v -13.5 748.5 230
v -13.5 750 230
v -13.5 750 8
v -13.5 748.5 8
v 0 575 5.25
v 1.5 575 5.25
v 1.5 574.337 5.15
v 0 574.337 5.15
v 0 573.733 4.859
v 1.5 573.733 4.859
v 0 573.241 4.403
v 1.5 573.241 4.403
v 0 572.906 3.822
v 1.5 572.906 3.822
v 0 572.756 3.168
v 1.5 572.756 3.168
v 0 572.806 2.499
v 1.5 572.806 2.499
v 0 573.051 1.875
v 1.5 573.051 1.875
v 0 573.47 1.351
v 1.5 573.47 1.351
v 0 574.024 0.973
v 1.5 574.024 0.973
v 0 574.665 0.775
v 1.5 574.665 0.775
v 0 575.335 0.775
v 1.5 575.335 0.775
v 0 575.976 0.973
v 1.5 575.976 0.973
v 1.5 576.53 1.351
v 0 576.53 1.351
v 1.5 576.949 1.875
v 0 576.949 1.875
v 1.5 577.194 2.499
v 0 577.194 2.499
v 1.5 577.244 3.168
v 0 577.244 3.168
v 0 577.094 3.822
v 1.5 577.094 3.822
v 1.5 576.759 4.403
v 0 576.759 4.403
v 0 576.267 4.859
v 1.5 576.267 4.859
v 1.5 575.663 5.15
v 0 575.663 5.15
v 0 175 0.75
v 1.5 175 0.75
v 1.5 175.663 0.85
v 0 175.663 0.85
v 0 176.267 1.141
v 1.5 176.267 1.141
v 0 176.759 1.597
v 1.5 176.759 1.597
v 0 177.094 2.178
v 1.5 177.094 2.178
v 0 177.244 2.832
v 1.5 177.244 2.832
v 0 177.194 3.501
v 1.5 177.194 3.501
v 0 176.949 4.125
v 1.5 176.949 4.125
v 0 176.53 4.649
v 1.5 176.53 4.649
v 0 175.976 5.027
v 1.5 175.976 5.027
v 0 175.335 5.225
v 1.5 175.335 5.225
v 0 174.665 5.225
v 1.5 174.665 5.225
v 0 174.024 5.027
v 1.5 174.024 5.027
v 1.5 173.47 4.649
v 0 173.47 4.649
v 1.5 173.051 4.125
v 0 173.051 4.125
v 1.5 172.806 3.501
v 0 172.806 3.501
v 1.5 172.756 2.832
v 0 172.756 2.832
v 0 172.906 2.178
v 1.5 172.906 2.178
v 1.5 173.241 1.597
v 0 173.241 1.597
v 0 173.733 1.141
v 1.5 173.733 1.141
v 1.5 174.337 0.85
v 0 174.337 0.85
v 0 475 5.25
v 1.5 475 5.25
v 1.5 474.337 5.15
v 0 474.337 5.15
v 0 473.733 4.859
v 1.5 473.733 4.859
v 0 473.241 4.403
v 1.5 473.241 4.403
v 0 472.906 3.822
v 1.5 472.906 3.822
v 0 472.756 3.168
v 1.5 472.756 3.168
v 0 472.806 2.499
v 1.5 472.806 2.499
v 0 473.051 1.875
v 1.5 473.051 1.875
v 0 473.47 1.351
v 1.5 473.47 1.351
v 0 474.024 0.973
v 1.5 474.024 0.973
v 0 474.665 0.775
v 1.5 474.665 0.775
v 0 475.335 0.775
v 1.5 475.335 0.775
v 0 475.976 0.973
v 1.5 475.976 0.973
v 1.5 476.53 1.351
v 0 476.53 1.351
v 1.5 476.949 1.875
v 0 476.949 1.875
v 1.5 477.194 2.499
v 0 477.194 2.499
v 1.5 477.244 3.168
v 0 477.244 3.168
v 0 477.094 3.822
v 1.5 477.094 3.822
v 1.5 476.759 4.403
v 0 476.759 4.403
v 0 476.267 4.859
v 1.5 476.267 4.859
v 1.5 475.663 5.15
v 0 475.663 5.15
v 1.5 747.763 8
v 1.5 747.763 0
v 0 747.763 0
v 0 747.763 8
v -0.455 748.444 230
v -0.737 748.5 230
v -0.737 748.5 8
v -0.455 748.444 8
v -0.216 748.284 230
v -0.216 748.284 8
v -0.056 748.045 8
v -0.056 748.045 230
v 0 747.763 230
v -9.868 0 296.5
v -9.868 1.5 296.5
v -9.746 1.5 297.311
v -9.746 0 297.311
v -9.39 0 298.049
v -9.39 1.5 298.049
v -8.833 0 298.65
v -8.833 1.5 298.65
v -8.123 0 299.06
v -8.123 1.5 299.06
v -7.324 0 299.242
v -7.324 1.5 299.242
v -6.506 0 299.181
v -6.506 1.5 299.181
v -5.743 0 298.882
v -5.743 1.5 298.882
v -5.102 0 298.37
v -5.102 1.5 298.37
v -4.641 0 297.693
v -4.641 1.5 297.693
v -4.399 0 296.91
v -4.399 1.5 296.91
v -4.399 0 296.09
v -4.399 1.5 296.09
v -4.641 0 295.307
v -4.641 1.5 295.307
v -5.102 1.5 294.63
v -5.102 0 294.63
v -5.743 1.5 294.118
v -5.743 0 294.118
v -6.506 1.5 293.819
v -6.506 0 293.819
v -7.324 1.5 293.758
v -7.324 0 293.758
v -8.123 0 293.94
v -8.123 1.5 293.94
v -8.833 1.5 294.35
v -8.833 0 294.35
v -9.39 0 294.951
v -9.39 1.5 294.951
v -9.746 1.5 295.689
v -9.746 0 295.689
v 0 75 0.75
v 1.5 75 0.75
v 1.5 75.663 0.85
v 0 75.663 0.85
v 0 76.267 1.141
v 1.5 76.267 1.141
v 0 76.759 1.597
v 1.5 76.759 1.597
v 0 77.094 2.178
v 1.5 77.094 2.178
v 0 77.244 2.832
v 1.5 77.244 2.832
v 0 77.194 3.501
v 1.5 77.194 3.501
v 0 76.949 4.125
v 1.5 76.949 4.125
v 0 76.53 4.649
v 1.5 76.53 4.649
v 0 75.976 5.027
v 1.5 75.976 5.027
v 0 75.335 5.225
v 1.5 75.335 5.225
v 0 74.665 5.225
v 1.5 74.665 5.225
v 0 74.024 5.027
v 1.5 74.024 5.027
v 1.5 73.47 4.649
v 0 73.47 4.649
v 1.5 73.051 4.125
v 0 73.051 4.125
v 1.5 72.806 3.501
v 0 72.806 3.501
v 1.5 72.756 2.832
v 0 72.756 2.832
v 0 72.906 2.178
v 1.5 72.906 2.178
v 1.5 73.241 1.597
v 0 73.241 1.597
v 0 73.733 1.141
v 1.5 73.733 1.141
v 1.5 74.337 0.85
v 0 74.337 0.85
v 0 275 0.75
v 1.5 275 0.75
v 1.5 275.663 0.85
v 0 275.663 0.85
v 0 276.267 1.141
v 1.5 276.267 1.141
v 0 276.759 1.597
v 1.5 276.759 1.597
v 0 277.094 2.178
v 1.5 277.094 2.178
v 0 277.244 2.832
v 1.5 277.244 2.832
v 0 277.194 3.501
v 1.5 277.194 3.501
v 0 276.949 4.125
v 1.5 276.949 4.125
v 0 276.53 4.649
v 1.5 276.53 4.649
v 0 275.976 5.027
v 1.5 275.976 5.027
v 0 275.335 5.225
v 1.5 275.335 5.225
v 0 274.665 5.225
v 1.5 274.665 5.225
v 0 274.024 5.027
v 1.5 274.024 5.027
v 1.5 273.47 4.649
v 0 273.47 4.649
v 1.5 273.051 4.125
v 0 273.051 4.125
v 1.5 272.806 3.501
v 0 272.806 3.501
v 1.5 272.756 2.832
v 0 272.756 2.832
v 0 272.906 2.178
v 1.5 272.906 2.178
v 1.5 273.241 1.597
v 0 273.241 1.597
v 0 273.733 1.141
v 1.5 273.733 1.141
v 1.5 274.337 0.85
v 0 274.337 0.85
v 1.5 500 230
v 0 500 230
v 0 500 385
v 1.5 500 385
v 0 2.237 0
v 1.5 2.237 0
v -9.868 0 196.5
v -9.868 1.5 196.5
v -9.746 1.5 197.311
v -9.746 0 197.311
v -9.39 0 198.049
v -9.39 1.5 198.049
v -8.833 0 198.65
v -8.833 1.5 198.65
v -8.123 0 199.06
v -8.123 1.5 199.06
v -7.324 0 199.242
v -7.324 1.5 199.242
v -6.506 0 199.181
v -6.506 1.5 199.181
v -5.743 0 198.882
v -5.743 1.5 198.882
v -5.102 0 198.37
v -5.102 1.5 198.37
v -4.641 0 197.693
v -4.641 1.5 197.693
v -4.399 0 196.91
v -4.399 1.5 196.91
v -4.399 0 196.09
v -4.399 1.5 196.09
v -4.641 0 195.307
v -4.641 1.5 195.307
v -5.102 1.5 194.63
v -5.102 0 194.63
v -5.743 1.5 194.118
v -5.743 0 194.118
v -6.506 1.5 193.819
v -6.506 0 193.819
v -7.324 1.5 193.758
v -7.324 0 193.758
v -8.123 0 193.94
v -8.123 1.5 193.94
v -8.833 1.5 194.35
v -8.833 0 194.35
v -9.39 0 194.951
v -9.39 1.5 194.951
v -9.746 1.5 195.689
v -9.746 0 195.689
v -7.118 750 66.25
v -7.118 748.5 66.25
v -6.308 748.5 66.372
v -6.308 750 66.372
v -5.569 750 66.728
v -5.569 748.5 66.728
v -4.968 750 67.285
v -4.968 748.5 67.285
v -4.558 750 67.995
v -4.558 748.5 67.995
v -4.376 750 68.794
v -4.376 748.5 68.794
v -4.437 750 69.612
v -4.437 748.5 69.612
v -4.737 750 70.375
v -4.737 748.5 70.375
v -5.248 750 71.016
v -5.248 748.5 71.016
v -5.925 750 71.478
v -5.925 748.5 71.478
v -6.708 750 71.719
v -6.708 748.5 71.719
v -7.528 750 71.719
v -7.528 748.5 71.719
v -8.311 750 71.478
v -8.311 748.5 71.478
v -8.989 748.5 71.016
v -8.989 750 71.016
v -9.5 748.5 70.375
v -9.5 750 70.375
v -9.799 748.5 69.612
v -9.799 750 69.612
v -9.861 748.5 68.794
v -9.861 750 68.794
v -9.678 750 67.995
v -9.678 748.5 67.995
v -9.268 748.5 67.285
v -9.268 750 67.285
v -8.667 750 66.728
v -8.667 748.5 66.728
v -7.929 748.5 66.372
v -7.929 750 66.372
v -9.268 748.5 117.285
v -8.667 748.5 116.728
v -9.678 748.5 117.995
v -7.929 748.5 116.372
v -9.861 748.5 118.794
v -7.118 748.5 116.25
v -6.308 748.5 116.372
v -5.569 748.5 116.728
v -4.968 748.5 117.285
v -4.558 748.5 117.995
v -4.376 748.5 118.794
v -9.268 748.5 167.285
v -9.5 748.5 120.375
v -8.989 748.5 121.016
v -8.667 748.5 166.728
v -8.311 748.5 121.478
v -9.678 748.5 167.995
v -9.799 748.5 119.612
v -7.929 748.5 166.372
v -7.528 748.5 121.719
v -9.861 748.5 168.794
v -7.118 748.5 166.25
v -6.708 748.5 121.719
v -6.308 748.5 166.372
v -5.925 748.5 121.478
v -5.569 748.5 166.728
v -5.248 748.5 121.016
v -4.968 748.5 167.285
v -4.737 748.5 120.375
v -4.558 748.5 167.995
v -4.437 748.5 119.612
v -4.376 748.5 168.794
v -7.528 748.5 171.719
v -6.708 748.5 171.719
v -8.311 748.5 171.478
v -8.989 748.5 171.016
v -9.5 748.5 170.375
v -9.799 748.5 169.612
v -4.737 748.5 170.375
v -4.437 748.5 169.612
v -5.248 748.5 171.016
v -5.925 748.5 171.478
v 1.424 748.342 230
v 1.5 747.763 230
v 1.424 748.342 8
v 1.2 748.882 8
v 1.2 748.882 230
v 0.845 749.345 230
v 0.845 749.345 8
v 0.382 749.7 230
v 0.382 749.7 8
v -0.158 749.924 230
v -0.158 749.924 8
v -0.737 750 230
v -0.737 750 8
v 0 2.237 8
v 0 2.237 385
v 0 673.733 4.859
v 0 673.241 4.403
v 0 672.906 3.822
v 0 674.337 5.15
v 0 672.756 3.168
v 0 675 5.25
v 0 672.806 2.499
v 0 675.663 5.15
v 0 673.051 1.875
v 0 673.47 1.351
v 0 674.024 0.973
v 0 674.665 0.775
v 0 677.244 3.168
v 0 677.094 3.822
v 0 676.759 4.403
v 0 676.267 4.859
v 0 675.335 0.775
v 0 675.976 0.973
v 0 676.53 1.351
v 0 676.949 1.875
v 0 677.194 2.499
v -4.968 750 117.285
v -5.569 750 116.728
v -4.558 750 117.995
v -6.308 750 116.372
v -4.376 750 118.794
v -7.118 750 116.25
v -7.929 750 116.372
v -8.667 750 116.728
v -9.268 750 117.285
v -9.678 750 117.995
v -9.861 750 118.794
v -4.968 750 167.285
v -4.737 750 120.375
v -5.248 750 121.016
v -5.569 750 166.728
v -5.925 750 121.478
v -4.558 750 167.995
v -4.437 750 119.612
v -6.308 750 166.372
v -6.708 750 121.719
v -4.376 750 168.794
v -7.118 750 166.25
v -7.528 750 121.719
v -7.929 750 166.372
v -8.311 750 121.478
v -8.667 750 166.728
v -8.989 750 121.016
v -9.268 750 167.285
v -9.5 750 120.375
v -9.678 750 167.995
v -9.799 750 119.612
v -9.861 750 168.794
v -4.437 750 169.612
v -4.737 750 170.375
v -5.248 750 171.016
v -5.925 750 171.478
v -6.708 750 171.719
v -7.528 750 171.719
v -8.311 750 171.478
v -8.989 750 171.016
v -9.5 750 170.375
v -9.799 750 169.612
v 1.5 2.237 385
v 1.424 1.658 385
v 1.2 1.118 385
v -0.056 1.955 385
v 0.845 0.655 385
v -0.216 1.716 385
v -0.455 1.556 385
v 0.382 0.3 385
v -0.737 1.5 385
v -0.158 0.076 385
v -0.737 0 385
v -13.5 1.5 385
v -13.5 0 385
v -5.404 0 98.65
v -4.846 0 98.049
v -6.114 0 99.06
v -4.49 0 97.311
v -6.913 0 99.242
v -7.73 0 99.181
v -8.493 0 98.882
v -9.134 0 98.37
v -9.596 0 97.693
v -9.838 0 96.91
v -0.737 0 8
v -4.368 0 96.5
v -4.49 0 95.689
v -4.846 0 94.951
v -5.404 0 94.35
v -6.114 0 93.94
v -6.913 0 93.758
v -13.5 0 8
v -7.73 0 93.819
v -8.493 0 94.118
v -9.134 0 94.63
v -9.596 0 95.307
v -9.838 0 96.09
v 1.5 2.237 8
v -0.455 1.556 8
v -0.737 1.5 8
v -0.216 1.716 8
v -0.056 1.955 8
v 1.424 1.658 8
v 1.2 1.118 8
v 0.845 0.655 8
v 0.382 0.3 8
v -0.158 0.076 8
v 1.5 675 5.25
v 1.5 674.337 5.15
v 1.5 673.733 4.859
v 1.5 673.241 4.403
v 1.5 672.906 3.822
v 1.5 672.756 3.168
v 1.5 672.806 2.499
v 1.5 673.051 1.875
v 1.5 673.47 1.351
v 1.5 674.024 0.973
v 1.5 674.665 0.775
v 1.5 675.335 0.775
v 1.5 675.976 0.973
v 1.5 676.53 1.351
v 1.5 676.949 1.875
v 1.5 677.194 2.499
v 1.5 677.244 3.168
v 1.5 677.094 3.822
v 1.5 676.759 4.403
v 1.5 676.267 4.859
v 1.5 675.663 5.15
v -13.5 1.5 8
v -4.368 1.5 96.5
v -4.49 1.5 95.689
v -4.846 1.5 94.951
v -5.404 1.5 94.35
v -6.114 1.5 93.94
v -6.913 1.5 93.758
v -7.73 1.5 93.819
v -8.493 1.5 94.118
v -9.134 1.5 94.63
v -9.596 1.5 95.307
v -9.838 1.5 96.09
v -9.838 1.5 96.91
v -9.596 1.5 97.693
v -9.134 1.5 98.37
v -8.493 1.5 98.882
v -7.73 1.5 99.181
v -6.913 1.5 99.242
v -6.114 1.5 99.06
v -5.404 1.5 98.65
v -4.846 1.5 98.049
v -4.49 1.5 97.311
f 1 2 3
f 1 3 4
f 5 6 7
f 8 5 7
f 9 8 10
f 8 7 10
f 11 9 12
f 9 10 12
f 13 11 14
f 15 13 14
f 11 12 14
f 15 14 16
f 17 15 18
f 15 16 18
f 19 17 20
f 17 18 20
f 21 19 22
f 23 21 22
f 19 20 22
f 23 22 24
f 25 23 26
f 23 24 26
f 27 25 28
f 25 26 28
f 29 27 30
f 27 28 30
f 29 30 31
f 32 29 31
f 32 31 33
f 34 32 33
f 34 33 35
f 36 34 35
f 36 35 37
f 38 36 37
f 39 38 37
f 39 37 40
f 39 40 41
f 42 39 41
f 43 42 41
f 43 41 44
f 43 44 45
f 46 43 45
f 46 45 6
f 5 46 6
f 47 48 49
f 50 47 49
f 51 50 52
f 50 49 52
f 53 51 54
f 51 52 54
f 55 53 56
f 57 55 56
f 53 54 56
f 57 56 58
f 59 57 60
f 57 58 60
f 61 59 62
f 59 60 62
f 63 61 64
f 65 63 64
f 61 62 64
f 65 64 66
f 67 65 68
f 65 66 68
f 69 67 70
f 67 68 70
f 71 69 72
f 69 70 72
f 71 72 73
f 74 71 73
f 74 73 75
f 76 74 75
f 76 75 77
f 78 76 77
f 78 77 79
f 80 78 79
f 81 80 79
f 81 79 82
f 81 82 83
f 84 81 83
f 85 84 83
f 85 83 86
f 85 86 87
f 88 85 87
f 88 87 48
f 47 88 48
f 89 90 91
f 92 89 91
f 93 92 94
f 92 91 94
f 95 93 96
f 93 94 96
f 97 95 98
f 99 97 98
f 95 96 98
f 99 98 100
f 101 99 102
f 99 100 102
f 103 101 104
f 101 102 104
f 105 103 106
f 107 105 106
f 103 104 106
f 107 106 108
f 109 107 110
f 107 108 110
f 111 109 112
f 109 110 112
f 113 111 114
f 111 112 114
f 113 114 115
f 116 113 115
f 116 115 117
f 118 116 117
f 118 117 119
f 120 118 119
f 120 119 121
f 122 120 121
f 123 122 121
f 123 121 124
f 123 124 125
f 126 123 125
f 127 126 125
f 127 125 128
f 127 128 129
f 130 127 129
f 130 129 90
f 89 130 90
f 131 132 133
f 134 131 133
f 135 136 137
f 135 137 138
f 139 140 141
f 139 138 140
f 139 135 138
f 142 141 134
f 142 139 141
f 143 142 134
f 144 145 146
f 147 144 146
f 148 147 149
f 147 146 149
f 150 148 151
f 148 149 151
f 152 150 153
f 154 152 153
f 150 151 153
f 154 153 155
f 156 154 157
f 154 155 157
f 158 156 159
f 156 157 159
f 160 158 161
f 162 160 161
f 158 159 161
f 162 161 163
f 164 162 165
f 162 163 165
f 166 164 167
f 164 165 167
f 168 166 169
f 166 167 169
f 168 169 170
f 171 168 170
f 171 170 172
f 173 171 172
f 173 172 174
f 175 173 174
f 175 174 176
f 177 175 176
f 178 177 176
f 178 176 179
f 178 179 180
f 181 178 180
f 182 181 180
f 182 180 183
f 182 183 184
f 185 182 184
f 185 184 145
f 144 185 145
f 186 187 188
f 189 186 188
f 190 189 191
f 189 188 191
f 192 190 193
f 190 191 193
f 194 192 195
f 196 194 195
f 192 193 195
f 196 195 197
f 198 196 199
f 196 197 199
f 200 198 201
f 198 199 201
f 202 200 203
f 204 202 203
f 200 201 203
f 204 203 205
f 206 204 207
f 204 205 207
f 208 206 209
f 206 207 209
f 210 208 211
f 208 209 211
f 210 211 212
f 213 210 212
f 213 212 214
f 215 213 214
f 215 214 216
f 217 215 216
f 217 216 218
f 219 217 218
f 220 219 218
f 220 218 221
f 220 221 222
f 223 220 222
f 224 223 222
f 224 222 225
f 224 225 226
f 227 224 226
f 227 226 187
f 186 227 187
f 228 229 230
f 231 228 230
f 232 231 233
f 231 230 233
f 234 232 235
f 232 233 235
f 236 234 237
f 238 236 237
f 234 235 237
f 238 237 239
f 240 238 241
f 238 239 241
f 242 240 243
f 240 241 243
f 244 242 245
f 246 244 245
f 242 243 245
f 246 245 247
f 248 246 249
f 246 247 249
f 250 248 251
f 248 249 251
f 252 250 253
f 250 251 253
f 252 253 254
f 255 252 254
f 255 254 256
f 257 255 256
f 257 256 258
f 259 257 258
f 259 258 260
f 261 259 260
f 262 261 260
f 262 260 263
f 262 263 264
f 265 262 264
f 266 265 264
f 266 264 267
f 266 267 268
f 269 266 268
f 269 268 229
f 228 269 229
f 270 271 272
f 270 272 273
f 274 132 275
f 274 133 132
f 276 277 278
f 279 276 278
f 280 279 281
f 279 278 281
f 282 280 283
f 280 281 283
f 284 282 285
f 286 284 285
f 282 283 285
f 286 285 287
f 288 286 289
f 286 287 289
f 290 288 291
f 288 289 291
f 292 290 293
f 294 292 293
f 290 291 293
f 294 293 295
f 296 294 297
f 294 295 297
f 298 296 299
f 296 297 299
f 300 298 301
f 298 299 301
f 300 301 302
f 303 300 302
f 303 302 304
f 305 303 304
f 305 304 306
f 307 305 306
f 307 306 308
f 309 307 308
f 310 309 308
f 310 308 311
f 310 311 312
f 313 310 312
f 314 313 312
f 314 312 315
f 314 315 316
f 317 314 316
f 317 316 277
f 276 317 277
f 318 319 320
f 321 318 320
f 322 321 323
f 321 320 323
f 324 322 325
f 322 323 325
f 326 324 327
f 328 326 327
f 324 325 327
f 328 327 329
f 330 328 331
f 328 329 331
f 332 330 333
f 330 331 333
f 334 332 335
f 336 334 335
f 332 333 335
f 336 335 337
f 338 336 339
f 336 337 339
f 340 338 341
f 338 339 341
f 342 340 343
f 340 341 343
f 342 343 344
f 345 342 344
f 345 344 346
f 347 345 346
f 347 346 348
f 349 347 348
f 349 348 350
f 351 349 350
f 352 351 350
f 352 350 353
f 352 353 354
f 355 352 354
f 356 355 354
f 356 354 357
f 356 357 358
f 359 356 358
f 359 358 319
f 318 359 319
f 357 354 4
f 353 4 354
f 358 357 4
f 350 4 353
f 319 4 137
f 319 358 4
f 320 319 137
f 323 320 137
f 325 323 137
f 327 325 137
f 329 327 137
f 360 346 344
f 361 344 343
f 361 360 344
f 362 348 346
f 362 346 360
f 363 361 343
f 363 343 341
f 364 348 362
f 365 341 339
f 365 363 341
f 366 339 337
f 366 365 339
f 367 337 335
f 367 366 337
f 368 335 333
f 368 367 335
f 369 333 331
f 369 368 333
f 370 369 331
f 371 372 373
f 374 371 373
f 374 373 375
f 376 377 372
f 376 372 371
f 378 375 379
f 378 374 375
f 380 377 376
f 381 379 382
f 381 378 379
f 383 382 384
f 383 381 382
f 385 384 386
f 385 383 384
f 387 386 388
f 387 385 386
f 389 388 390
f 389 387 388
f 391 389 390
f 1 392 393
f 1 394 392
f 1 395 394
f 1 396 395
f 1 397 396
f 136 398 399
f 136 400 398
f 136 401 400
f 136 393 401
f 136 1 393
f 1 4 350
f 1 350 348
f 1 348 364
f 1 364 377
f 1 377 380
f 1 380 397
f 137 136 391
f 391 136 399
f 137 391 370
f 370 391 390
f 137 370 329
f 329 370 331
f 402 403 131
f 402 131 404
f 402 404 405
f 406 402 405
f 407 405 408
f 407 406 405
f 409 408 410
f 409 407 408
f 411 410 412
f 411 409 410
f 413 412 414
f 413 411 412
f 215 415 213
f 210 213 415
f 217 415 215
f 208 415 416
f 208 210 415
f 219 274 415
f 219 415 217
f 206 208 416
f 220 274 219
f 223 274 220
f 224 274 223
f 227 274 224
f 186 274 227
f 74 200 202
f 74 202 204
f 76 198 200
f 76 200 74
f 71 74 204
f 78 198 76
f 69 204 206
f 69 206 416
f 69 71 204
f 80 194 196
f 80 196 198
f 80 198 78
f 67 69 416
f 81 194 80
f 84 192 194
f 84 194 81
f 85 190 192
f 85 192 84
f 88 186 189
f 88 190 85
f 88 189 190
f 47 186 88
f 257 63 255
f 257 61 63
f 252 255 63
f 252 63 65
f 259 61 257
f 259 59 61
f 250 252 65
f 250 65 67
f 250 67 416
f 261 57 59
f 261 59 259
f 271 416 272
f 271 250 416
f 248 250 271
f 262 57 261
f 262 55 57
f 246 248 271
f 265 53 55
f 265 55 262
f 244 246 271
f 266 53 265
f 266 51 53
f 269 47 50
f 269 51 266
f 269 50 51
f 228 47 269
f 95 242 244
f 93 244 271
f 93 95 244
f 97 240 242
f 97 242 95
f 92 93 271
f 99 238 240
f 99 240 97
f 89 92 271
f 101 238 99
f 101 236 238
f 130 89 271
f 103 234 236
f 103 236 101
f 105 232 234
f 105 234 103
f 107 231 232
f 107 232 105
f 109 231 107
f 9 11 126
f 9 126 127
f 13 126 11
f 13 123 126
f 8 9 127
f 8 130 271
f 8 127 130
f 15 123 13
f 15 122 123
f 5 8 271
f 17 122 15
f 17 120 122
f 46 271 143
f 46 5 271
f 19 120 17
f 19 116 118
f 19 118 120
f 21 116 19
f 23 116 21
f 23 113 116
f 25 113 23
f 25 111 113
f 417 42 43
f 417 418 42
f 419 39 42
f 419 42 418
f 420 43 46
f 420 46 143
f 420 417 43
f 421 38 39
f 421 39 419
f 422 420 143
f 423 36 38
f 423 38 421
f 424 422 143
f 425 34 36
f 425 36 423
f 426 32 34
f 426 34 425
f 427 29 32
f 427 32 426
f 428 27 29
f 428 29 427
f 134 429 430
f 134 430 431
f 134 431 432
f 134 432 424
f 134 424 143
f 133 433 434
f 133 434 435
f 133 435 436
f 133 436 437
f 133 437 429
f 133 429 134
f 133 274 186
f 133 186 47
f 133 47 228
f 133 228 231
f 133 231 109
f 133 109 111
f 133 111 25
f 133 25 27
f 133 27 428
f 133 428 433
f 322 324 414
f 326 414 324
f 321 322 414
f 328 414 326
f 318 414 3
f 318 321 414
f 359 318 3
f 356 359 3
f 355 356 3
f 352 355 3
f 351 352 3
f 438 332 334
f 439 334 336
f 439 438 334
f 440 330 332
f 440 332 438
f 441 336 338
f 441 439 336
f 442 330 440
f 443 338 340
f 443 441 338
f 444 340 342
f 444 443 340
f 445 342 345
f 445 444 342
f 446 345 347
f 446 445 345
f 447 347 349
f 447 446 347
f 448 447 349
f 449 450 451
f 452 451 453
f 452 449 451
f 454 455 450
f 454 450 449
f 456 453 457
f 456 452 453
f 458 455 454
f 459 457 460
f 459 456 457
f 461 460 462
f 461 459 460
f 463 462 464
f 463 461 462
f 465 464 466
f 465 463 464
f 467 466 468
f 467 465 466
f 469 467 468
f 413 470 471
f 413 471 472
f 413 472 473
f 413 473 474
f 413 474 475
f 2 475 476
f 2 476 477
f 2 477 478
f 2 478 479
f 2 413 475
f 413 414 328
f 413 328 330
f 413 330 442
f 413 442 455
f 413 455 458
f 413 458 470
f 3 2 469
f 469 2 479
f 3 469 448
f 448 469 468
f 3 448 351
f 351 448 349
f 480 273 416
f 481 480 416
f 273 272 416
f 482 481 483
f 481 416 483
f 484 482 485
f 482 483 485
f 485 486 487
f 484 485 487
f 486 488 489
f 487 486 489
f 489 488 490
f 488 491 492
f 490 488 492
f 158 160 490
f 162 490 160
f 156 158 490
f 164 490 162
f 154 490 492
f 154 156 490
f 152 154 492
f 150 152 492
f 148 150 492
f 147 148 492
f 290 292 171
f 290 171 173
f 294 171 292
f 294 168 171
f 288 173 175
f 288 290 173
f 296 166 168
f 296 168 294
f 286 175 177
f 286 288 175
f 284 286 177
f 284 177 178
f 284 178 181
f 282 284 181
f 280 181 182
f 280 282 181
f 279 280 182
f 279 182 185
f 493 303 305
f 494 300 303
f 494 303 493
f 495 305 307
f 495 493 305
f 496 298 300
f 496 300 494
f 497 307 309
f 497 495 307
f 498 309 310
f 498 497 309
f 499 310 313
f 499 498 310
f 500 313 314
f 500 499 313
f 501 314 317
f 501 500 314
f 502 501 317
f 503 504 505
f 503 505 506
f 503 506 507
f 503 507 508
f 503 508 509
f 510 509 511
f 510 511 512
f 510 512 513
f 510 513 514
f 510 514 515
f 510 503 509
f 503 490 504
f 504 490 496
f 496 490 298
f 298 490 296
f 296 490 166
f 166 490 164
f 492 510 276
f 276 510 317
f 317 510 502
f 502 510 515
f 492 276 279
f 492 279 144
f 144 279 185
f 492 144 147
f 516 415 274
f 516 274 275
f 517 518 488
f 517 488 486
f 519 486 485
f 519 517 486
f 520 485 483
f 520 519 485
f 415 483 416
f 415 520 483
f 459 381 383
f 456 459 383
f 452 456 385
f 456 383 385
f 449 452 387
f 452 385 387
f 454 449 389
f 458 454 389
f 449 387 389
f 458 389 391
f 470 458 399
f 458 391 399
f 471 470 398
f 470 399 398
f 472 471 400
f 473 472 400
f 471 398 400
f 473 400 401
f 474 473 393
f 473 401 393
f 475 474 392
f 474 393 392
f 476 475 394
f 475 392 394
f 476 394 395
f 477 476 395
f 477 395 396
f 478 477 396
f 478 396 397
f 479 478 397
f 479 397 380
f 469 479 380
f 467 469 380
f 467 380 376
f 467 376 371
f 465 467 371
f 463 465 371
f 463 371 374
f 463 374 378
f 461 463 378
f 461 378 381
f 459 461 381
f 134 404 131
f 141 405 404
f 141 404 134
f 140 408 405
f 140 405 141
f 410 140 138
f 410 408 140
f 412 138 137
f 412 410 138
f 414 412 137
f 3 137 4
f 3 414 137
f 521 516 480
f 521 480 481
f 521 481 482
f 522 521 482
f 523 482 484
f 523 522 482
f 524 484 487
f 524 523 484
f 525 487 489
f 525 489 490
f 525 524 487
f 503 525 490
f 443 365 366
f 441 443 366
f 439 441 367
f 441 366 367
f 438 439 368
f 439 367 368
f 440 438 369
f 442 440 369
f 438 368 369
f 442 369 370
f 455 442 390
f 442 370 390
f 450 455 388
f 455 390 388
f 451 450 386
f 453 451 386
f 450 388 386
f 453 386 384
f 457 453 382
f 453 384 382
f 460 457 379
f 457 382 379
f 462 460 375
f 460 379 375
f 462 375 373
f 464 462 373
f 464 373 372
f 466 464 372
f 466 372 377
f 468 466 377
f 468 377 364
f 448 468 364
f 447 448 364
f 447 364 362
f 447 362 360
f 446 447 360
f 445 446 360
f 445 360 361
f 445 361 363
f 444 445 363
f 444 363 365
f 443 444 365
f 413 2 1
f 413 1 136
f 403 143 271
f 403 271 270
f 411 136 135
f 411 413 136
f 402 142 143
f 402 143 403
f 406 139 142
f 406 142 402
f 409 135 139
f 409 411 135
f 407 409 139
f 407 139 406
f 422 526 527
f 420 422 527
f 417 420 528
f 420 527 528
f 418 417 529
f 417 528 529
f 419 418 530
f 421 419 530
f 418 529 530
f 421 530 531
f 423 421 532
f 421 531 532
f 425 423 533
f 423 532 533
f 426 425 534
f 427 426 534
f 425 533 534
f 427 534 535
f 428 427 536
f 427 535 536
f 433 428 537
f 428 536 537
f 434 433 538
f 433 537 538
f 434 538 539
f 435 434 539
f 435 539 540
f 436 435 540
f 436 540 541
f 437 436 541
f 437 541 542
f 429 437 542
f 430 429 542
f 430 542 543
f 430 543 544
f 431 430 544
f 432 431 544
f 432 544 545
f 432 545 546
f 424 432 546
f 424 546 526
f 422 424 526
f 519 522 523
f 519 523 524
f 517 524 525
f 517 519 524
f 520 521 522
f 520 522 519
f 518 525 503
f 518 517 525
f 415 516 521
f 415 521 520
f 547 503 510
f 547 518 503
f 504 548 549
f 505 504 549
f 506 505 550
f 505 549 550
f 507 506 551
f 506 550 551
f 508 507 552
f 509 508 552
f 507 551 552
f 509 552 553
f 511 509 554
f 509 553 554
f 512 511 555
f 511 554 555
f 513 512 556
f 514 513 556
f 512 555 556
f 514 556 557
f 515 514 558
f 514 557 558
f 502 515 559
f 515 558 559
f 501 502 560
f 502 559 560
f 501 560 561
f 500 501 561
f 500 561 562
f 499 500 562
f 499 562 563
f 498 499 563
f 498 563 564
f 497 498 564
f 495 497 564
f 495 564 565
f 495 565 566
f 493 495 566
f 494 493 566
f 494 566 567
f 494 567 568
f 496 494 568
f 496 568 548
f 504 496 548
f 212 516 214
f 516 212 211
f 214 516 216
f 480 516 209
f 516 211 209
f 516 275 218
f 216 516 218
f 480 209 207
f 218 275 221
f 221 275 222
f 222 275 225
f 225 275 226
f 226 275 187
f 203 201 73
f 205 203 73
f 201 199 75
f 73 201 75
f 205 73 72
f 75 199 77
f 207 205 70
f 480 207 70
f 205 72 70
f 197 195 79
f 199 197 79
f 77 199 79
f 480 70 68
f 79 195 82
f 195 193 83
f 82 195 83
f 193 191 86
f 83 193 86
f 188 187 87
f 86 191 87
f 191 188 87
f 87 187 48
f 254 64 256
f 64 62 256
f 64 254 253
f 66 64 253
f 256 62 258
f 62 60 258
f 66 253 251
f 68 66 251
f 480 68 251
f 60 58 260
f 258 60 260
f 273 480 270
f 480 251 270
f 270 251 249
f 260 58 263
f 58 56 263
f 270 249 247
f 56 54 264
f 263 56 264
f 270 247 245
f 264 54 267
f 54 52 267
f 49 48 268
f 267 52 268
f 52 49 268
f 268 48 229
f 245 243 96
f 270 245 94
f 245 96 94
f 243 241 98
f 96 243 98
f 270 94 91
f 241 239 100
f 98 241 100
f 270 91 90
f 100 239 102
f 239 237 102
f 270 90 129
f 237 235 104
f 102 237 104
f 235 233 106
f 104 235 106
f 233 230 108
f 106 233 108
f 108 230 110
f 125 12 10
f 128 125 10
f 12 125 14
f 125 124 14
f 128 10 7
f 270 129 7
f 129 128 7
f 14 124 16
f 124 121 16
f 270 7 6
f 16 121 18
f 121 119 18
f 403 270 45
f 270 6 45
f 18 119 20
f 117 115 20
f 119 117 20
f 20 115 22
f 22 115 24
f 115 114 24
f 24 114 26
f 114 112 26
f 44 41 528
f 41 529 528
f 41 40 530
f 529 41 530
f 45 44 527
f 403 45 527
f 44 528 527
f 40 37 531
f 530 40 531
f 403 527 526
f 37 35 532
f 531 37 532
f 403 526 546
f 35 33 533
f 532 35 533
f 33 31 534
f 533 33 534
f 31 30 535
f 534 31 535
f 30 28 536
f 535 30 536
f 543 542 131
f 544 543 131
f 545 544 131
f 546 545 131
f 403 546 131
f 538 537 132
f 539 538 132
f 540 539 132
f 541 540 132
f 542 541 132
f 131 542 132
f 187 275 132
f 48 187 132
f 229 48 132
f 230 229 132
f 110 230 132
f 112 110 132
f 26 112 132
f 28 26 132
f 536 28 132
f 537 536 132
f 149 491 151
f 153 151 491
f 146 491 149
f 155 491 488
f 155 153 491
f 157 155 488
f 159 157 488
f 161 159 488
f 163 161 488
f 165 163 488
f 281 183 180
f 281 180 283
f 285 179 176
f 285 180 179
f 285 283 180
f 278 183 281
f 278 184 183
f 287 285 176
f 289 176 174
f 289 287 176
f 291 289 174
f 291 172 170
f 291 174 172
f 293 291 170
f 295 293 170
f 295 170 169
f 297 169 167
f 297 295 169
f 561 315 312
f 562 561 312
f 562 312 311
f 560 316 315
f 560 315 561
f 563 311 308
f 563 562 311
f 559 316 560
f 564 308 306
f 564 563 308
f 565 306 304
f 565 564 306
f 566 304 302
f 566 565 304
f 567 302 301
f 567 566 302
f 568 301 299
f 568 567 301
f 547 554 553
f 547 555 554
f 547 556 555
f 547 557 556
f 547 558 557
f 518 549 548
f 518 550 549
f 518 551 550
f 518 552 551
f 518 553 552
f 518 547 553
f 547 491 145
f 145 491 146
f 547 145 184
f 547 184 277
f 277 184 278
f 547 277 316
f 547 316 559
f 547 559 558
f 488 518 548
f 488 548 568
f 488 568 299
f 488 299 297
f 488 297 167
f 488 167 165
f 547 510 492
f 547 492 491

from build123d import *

# Parameters (mm, degrees)
SKETCH_1_W                       = 1.5
SKETCH_1_H                       = 750
SM_BASE_FLANGE_1_DEPTH           = 385
SM_EDGE_FLANGE_1_STRIP_W         = 7.4732
SM_EDGE_FLANGE_1_STRIP_H         = 1.5
SM_EDGE_FLANGE_1_STRIP_CUT_DEPTH = 385
SM_EDGE_FLANGE_1_DEPTH           = 385
SM_EDGE_FLANGE_2_STRIP_W         = 7.4732
SM_EDGE_FLANGE_2_STRIP_H         = 1.5
SM_EDGE_FLANGE_2_STRIP_CUT_DEPTH = 385
SM_EDGE_FLANGE_2_DEPTH           = 385
SKETCH_12_W                      = 17.104155355
SKETCH_12_H                      = 8.497904819
CUT_EXTRUDE_1_DEPTH              = 8
CUT_EXTRUDE_START                = -8
CUT_EXTRUDE_3_DEPTH              = 8
SKETCH_16_W                      = 51.042433358
SKETCH_16_H                      = 155
CUT_EXTRUDE_4_DEPTH              = 248.5
SKETCH_17_R                      = 2.75
CUT_EXTRUDE_5_DEPTH              = 20
SKETCH_18_R                      = 2.75
CUT_EXTRUDE_6_DEPTH              = 20
SKETCH_19_W                      = 1.5
SKETCH_19_H                      = 155
CUT_EXTRUDE_7_DEPTH              = 1.5
SKETCH_21_R                      = 2.25
CUT_EXTRUDE_9_DEPTH              = 10


# Read off the part's stored shape, not the designer's step: 切除-拉伸3
# Sheet-metal steps are written as plain solids
with BuildPart() as part:
    # Sketch 1 → 基体-法兰1 (new body)
    with BuildSketch(Plane.XY):
        with Locations((0.75, 375)):
            Rectangle(SKETCH_1_W, SKETCH_1_H)
    extrude(amount=SM_BASE_FLANGE_1_DEPTH)

    # 边线-法兰1 strip (across the edge) → 边线-法兰1 strip cut (cut)
    with BuildSketch(Plane(origin=(0, 750, 385), x_dir=(0, -1, 0), z_dir=(0, 0, -1))):
        with Locations((-1.5, -0.75)):
            Rectangle(SM_EDGE_FLANGE_1_STRIP_W, SM_EDGE_FLANGE_1_STRIP_H)
    extrude(amount=SM_EDGE_FLANGE_1_STRIP_CUT_DEPTH, mode=Mode.SUBTRACT)

    # 边线-法兰1 section (across the edge) → 边线-法兰1 (add)
    with BuildSketch(Plane(origin=(0, 750, 385), x_dir=(0, -1, 0), z_dir=(0, 0, -1))):
        with BuildLine():
            Line((0, 0.7366), (0, 13.5))
            Line((0, 13.5), (1.5, 13.5))
            Line((1.5, 13.5), (1.5, 0.7366))
            ThreePointArc((1.5, 0.7366), (1.715745145, 0.215745145), (2.2366, 0))
            Line((2.2366, 0), (2.2366, -1.5))
            ThreePointArc((2.2366, -1.5), (0.655084973, -0.844915027), (0, 0.7366))
        make_face()
    extrude(amount=SM_EDGE_FLANGE_1_DEPTH)

    # 边线-法兰2 strip (across the edge) → 边线-法兰2 strip cut (cut)
    with BuildSketch(Plane(origin=(0, 0, 0), x_dir=(0, 1, 0), z_dir=(0, 0, 1))):
        with Locations((-1.5, -0.75)):
            Rectangle(SM_EDGE_FLANGE_2_STRIP_W, SM_EDGE_FLANGE_2_STRIP_H)
    extrude(amount=SM_EDGE_FLANGE_2_STRIP_CUT_DEPTH, mode=Mode.SUBTRACT)

    # 边线-法兰2 section (across the edge) → 边线-法兰2 (add)
    with BuildSketch(Plane(origin=(0, 0, 0), x_dir=(0, 1, 0), z_dir=(0, 0, 1))):
        with BuildLine():
            Line((0, 0.7366), (0, 13.5))
            Line((0, 13.5), (1.5, 13.5))
            Line((1.5, 13.5), (1.5, 0.7366))
            ThreePointArc((1.5, 0.7366), (1.715745145, 0.215745145), (2.2366, 0))
            Line((2.2366, 0), (2.2366, -1.5))
            ThreePointArc((2.2366, -1.5), (0.655084973, -0.844915027), (0, 0.7366))
        make_face()
    extrude(amount=SM_EDGE_FLANGE_2_DEPTH)

    # 草图12 → 切除-拉伸1 (cut)
    with BuildSketch(Plane(origin=(0, 0, 0), x_dir=(-1, 0, 0), z_dir=(0, 0, -1))):
        with Locations((7.052077678, 752.01235241)):
            Rectangle(SKETCH_12_W, SKETCH_12_H)
    extrude(amount=-CUT_EXTRUDE_1_DEPTH, mode=Mode.SUBTRACT)

    # 切除-拉伸3 outline → 切除-拉伸3 (cut)
    with BuildSketch(Plane(origin=(0, 0, 0), x_dir=(-1, 0, 0), z_dir=(0, 0, -1)).offset(CUT_EXTRUDE_START)):
        with BuildLine():
            Line((0, 2.2366), (-1.5, 2.2366))
            ThreePointArc((-1.5, 2.2366), (-0.844915027, 0.655084973), (0.7366, 0))
            Line((0.7366, 0), (13.5, 0))
            Line((13.5, 0), (13.5, 1.5))
            Line((13.5, 1.5), (0.7366, 1.5))
            ThreePointArc((0.7366, 1.5), (0.215745145, 1.715745145), (0, 2.2366))
        make_face()
    extrude(amount=CUT_EXTRUDE_3_DEPTH, mode=Mode.SUBTRACT)

    # 草图16 → 切除-拉伸4 (cut)
    with BuildSketch(Plane(origin=(0, 750, 0), x_dir=(1, 0, 0), z_dir=(0, 1, 0))):
        with Locations((12.021216679, -307.5)):
            Rectangle(SKETCH_16_W, SKETCH_16_H)
    extrude(amount=-CUT_EXTRUDE_4_DEPTH, mode=Mode.SUBTRACT)

    # 草图17 → 切除-拉伸5 (cut)
    with BuildSketch(Plane(origin=(0, 1.5, 0), x_dir=(1, 0, 0), z_dir=(0, 1, 0))):
        with Locations(Location((-7.1183, -296.5, 0), (0, 0, 180))):
            Circle(SKETCH_17_R)
        with Locations(Location((-7.1183, -196.5, 0), (0, 0, 180))):
            Circle(SKETCH_17_R)
        with Locations((-7.1183, -96.5)):
            Circle(SKETCH_17_R)
    extrude(amount=-CUT_EXTRUDE_5_DEPTH, mode=Mode.SUBTRACT)

    # 草图18 → 切除-拉伸6 (cut)
    with BuildSketch(Plane.XZ.offset(-748.5)):
        with Locations(Location((-7.1183, 69, 0), (0, 0, 270))):
            Circle(SKETCH_18_R)
        with Locations(Location((-7.1183, 119, 0), (0, 0, 270))):
            Circle(SKETCH_18_R)
        with Locations(Location((-7.1183, 169, 0), (0, 0, 270))):
            Circle(SKETCH_18_R)
    extrude(amount=-CUT_EXTRUDE_6_DEPTH, mode=Mode.SUBTRACT)

    # 草图19 → 切除-拉伸7 (cut)
    with BuildSketch(Plane(origin=(0, 501.5, 0), x_dir=(1, 0, 0), z_dir=(0, 1, 0))):
        with Locations((0.75, -307.5)):
            Rectangle(SKETCH_19_W, SKETCH_19_H)
    extrude(amount=-CUT_EXTRUDE_7_DEPTH, mode=Mode.SUBTRACT)

    # 草图21 → 切除-拉伸9 (cut)
    with BuildSketch(Plane(origin=(1.5, 0, 0), x_dir=(0, 0, -1), z_dir=(1, 0, 0))):
        with Locations((-3, 75)):
            Circle(SKETCH_21_R)
        with Locations((-3, 175)):
            Circle(SKETCH_21_R)
        with Locations((-3, 275)):
            Circle(SKETCH_21_R)
        with Locations(Location((-3, 475, 0), (0, 0, 180))):
            Circle(SKETCH_21_R)
        with Locations(Location((-3, 575, 0), (0, 0, 180))):
            Circle(SKETCH_21_R)
        with Locations(Location((-3, 675, 0), (0, 0, 180))):
            Circle(SKETCH_21_R)
    extrude(amount=-CUT_EXTRUDE_9_DEPTH, mode=Mode.SUBTRACT)


solid = part.part
